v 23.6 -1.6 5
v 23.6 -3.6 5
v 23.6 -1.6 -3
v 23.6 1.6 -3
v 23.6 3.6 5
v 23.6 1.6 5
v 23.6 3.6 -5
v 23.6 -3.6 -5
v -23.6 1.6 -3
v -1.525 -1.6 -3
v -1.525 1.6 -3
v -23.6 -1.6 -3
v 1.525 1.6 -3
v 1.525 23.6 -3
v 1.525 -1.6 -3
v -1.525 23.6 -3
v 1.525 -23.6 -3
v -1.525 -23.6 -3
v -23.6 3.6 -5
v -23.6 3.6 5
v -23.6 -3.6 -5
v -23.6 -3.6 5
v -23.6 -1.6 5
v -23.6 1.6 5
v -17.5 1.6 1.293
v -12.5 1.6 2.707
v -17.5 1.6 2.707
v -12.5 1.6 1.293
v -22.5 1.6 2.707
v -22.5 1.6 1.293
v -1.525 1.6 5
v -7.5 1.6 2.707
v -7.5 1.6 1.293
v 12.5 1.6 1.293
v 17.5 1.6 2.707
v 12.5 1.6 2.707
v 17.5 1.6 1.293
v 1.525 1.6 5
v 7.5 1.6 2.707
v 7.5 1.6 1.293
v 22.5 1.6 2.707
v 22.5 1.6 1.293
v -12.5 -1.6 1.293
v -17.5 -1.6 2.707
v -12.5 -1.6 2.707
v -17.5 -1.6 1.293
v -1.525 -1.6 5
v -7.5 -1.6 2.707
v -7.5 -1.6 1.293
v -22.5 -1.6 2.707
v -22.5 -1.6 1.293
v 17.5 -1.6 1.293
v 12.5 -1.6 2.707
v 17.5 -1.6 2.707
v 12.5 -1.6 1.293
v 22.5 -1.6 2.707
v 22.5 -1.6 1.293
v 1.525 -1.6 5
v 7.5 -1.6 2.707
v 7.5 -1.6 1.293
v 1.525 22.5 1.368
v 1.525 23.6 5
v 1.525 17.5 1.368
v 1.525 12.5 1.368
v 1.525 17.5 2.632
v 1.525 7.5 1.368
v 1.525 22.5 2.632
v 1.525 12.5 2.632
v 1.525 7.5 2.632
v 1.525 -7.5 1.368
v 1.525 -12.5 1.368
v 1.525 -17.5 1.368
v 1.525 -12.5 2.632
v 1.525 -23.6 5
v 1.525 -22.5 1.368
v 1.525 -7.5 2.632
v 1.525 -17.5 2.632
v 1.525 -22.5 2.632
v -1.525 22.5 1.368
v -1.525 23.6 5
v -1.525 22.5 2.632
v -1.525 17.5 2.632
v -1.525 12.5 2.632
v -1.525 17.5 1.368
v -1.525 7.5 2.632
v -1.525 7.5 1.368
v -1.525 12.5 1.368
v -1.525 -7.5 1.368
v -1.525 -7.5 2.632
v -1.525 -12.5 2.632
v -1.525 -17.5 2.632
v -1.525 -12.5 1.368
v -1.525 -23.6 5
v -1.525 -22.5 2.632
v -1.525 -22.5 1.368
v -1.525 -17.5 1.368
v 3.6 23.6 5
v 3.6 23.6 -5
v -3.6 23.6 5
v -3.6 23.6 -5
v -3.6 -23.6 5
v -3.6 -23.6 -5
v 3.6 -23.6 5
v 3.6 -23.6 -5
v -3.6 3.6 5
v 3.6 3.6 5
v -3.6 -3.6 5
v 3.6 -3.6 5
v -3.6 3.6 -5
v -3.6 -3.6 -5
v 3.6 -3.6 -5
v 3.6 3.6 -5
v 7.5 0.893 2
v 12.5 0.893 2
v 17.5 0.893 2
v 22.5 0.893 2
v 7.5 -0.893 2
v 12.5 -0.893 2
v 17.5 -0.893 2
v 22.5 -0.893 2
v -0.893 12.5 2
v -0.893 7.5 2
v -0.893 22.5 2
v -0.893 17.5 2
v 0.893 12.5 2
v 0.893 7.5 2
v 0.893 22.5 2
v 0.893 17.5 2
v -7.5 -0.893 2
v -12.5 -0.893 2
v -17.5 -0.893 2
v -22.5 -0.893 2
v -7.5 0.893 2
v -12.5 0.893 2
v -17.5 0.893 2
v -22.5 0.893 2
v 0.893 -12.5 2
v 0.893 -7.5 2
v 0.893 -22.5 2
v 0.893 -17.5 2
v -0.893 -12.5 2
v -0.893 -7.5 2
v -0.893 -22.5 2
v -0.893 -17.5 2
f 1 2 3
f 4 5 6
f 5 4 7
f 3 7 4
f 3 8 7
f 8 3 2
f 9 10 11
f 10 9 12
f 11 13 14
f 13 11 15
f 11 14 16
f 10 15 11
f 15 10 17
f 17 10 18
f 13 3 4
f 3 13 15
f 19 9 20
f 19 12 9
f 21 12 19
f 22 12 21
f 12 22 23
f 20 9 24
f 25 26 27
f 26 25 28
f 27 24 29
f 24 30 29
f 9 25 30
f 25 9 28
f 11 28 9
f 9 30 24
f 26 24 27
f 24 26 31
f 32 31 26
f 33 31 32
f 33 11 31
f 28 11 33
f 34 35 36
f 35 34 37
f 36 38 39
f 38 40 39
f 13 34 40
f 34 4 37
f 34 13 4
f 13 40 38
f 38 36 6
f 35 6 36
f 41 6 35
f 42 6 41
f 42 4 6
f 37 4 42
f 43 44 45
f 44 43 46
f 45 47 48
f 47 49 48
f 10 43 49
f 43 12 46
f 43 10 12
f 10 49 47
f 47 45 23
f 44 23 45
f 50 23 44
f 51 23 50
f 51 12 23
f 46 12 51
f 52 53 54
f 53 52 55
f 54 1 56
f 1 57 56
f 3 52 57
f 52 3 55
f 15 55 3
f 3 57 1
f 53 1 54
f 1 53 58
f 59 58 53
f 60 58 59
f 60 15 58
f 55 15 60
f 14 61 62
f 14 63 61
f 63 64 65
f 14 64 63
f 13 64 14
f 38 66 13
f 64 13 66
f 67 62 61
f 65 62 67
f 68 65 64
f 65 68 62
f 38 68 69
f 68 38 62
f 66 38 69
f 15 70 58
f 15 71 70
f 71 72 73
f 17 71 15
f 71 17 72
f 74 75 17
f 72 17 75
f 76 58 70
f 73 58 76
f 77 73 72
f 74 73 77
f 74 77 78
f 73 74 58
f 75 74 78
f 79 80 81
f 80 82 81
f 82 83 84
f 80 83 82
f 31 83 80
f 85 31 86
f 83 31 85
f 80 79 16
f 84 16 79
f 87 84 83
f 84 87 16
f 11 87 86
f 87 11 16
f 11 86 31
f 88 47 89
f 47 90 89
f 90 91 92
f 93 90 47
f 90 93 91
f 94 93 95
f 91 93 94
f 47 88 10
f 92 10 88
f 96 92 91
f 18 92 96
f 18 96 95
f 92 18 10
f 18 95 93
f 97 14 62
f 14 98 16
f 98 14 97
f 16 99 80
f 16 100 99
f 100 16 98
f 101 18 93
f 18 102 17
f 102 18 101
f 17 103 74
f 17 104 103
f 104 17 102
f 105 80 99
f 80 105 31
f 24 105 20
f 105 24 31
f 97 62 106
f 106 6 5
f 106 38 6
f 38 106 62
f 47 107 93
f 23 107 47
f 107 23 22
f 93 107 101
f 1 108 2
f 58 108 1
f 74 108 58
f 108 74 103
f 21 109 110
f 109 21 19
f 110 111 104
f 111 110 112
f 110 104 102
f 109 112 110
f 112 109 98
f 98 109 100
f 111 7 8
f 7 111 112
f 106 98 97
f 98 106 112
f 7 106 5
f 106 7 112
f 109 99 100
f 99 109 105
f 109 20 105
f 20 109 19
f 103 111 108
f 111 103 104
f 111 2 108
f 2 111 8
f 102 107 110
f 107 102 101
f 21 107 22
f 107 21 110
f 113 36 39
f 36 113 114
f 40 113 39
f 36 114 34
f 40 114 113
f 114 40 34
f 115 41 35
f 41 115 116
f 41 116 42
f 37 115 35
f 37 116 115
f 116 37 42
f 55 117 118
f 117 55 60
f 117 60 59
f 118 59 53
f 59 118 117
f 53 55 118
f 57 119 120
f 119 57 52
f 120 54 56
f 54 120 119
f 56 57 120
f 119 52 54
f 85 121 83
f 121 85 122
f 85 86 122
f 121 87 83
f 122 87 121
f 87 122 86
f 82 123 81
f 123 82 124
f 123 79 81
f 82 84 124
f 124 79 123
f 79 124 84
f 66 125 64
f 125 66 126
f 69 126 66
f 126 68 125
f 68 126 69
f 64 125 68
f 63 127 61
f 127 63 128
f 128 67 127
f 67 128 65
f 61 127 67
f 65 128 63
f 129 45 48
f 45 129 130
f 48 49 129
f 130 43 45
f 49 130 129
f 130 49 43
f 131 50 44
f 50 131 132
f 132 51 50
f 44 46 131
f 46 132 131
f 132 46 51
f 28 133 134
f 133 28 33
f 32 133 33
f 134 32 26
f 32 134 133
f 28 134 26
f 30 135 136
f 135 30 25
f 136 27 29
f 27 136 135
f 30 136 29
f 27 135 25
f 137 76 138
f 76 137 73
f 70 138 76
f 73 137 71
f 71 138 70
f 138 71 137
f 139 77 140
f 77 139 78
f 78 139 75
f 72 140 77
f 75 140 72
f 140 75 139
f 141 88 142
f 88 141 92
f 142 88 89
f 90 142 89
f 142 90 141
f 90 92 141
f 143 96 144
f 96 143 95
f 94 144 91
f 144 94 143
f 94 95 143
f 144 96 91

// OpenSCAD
/*
 * Variable Schubladenunterteilung
 * Author: Felicia <felicia@drachenkatze.org>
 */

/* Width of the paper rail
 * If you use clips, this should be your paper
 * width plus the clip height. If your 3D printer isn't
 * precise and tends to print gaps larger than they are,
 * you might need to test it with 0.1mm increments.
 */
paperwidth=3.2; 
      
/* The length of the paper guide rails */      
guidelen=20;

/* The outside width of the rails. Depends on your
 * 3D Printer. A 2mm thick rail is usually good */
guidewidth=2;   // How thick should the rails be

/* The rail height */
height=10;      // How high should the rails be

/* The base thickness */
bottomwidth=2;  // Base thickness

tri=false;       // Should it be a quad or tri piece
edge=false;      // If true, renders an edge piece

// Advanced
clips=true;     // If true, adds clips to hold the paper
clipsize=0.5;   // The clip height
clipwidth=5;       // The width of the clips
clipheight = 2; // The offset of the clips relative to the model's centre

module maincube () {
cube([
    (2*guidelen)+(2*guidewidth)+paperwidth,
    (2*guidelen)+(2*guidewidth)+paperwidth,
    height],
    center=true);
}

module paperguides (trilen) {
    vlen = (2*guidelen)+(2*guidewidth)+paperwidth;
    trilen = vlen;
    
    if (tri) {
        trilen = guidelen;
    } else {
        trilen = vlen;
    }
        
    translate([0,0,bottomwidth]) {
    cube([
    vlen,
    paperwidth,
    height],
    center=true);
        
        cube([
        paperwidth-0.15,
        trilen,
    height],
    center=true);
    }
}

module cutawaycube () {
cube([guidelen,guidelen,height],center=true);
}

cutawayoffset=guidelen/2+paperwidth/2+guidewidth;

module all () {
difference () {
    maincube();
    paperguides(tri);
    
    translate([cutawayoffset,cutawayoffset,0]) {
    cutawaycube();
    }
    
    
    translate([-cutawayoffset,cutawayoffset,0]) {
    cutawaycube();
    }
    
    translate([cutawayoffset,-cutawayoffset,0]) {
    cutawaycube();
    }
    
    translate([-cutawayoffset,-cutawayoffset,0]) {
    cutawaycube();
    }
    
}

    if (clips) {
    rotate([0,0,0]) {
    clips();
    }
    rotate([0,0,90]) {
    clips();
    }
    rotate([0,0,180]) {
    clips();
    }
    rotate([0,0,270]) {
    clips();
    }
}
}

difference() {
    all();
    
    if (tri || edge) {
        translate([0,paperwidth+(2*guidewidth)+guidelen]) {
        cube([(2*guidelen)+(2*guidewidth)+paperwidth,
               (2*guidelen)+(2*guidewidth)+paperwidth,
        height],center=true);
        }
    }
    
    if (edge) {
        rotate([0,0,90]) {
        translate([0,paperwidth+(2*guidewidth)+guidelen]) {
        cube([(2*guidelen)+(2*guidewidth)+paperwidth,
               (2*guidelen)+(2*guidewidth)+paperwidth,
        height],center=true);
        }
    }
    }
    
    
}

// Generates a single, 45° rotated clip
module clip () {
    translate([0,0,clipheight]) {
    rotate([45,0,0]) {
     cube([clipwidth, clipsize*2, clipsize*2],center=true);
    }
    }
}

module twoclips () {
    translate([guidelen/4*2,0,0]) {
    clip();
    }
    
    translate([guidelen/4*4,0,0]) {
    clip();
    }
}

module clips () {
    translate([0,paperwidth/2,0]) {
    twoclips();
    }
    
    translate([0,0-paperwidth/2,0]) {
    twoclips();
    }
}
